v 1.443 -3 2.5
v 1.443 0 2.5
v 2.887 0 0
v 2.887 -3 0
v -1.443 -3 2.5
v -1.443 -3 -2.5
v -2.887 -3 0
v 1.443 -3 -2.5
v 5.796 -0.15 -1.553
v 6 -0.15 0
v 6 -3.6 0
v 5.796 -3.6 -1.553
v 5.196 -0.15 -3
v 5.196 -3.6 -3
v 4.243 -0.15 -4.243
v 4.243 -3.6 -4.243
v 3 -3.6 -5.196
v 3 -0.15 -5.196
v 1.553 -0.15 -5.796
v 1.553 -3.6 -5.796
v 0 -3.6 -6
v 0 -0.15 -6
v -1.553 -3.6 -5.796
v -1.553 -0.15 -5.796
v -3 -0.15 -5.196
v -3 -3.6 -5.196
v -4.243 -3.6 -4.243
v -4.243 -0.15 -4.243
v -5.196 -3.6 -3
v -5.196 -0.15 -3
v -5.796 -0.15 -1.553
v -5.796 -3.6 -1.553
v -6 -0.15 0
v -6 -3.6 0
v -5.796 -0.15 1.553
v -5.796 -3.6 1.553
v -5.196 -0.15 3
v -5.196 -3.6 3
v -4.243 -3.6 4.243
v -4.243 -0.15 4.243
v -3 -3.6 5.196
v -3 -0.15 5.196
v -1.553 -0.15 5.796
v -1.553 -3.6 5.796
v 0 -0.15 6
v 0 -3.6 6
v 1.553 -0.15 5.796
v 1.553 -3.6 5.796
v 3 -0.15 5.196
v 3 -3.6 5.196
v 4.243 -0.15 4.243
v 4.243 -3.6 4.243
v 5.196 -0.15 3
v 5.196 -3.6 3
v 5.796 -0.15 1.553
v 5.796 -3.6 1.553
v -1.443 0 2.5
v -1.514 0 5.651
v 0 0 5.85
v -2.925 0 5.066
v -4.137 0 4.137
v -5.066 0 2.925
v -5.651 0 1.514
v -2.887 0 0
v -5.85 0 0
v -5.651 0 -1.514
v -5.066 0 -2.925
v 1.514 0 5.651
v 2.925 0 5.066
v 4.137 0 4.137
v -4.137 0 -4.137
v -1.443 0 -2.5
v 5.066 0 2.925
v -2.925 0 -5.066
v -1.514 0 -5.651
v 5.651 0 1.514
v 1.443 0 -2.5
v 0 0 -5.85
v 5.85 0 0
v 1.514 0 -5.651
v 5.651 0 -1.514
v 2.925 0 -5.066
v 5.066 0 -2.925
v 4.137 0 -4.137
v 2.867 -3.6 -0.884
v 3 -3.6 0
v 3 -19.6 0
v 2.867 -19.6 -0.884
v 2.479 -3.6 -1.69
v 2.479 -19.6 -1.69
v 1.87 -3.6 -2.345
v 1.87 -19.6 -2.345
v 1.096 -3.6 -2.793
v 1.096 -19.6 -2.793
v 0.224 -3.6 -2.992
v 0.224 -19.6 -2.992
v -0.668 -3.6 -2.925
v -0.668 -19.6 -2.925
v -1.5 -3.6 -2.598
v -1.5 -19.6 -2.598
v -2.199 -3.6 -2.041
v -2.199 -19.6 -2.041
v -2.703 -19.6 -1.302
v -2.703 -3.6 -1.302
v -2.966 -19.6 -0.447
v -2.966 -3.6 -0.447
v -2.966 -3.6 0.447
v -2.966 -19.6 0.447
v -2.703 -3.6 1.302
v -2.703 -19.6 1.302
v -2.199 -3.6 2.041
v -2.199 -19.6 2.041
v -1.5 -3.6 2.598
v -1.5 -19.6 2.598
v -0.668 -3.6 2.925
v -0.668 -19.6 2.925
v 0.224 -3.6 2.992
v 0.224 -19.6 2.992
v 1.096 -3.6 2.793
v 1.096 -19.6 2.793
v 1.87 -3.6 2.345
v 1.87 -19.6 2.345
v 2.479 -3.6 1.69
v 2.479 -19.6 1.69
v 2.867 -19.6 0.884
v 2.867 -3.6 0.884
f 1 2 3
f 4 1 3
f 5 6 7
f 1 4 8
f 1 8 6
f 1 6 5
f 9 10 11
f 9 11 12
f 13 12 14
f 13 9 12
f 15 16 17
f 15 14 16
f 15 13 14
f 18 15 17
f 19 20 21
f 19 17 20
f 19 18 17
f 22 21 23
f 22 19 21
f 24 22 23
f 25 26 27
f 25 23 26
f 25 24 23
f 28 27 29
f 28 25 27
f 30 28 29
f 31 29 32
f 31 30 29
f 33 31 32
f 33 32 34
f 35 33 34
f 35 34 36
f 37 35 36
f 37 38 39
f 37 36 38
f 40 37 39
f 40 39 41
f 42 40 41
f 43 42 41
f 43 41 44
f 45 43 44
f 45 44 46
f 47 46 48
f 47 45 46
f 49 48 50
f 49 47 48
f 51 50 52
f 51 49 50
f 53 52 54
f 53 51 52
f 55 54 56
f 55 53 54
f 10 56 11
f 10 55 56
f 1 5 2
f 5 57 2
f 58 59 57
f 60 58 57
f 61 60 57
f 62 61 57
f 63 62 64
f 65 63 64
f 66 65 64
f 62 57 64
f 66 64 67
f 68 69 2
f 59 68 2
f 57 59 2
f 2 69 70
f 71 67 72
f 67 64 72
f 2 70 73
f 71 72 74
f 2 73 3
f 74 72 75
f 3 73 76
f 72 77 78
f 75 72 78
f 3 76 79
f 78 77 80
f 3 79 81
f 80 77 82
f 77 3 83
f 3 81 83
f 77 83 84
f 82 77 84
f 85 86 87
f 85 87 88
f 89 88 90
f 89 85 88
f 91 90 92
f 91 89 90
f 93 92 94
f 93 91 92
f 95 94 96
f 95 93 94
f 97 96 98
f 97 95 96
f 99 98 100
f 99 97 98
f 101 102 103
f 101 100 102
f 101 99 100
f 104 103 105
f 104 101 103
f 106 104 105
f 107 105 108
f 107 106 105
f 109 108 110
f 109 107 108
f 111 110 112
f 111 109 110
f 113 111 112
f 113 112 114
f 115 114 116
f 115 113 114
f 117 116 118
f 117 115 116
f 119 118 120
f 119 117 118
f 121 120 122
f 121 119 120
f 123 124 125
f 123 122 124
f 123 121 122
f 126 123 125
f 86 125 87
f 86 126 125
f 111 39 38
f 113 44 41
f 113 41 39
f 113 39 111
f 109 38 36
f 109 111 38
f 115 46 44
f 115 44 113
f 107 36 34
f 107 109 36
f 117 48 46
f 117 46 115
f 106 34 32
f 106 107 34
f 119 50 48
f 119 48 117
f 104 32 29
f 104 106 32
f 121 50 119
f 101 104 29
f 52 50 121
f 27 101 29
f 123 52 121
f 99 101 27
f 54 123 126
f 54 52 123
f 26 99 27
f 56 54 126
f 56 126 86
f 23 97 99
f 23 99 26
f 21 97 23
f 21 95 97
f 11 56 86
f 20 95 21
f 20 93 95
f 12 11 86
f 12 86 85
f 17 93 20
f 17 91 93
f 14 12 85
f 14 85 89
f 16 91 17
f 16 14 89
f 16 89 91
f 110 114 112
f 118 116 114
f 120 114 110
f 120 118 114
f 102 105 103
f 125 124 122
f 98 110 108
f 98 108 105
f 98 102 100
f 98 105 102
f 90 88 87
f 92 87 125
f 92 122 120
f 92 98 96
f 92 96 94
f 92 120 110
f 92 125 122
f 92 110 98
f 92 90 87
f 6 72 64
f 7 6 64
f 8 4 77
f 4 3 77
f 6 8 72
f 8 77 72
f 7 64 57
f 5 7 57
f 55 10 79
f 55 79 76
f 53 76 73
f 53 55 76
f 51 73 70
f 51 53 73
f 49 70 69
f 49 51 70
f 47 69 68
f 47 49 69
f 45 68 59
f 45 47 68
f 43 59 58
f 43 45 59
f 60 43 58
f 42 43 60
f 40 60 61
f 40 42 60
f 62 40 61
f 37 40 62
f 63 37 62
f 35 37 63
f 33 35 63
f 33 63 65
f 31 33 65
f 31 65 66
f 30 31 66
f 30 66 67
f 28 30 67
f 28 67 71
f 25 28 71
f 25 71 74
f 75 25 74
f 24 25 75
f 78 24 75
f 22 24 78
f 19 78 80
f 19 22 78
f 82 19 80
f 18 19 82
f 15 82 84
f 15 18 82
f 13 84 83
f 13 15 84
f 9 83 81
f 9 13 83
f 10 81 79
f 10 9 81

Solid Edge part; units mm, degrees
sketch "Sketch1" plane through (0, 0, 0) normal (0, -1, 0) x (1, 0, 0)
  circle A0 centre (0, 0) radius 6
extrude "Protrusion1" add sketch "Sketch1" along normal blind 3.6
sketch "Sketch2" plane through (0, -3.6, 0) normal (0, -1, 0) x (1, 0, 0)
  circle A0 centre (0, 0) radius 3
extrude "Protrusion2" add sketch "Sketch2" along normal blind 16
cosmetic_thread "Thread1" size "M6"
sketch "Sketch3" plane through (0, 0, 0) normal (0, 1, 0) x (0, 0, -1)
  line L0 (2.5, -1.4434) -> (2.5, 1.4434)
  line L1 (2.5, 1.4434) -> (0, 2.8868)
  line L2 (0, 2.8868) -> (-2.5, 1.4434)
  line L3 (-2.5, 1.4434) -> (-2.5, -1.4434)
  line L4 (-2.5, -1.4434) -> (0, -2.8868)
  line L5 (0, -2.8868) -> (2.5, -1.4434)
extrude "ExtrudedCutout_4" cut sketch "Sketch3" against normal blind 3
chamfer "Chamfer_1" distance 0.15 angle 45 1 edges at (-6, 0, 0)
properties material "Nylon, general purpose"
